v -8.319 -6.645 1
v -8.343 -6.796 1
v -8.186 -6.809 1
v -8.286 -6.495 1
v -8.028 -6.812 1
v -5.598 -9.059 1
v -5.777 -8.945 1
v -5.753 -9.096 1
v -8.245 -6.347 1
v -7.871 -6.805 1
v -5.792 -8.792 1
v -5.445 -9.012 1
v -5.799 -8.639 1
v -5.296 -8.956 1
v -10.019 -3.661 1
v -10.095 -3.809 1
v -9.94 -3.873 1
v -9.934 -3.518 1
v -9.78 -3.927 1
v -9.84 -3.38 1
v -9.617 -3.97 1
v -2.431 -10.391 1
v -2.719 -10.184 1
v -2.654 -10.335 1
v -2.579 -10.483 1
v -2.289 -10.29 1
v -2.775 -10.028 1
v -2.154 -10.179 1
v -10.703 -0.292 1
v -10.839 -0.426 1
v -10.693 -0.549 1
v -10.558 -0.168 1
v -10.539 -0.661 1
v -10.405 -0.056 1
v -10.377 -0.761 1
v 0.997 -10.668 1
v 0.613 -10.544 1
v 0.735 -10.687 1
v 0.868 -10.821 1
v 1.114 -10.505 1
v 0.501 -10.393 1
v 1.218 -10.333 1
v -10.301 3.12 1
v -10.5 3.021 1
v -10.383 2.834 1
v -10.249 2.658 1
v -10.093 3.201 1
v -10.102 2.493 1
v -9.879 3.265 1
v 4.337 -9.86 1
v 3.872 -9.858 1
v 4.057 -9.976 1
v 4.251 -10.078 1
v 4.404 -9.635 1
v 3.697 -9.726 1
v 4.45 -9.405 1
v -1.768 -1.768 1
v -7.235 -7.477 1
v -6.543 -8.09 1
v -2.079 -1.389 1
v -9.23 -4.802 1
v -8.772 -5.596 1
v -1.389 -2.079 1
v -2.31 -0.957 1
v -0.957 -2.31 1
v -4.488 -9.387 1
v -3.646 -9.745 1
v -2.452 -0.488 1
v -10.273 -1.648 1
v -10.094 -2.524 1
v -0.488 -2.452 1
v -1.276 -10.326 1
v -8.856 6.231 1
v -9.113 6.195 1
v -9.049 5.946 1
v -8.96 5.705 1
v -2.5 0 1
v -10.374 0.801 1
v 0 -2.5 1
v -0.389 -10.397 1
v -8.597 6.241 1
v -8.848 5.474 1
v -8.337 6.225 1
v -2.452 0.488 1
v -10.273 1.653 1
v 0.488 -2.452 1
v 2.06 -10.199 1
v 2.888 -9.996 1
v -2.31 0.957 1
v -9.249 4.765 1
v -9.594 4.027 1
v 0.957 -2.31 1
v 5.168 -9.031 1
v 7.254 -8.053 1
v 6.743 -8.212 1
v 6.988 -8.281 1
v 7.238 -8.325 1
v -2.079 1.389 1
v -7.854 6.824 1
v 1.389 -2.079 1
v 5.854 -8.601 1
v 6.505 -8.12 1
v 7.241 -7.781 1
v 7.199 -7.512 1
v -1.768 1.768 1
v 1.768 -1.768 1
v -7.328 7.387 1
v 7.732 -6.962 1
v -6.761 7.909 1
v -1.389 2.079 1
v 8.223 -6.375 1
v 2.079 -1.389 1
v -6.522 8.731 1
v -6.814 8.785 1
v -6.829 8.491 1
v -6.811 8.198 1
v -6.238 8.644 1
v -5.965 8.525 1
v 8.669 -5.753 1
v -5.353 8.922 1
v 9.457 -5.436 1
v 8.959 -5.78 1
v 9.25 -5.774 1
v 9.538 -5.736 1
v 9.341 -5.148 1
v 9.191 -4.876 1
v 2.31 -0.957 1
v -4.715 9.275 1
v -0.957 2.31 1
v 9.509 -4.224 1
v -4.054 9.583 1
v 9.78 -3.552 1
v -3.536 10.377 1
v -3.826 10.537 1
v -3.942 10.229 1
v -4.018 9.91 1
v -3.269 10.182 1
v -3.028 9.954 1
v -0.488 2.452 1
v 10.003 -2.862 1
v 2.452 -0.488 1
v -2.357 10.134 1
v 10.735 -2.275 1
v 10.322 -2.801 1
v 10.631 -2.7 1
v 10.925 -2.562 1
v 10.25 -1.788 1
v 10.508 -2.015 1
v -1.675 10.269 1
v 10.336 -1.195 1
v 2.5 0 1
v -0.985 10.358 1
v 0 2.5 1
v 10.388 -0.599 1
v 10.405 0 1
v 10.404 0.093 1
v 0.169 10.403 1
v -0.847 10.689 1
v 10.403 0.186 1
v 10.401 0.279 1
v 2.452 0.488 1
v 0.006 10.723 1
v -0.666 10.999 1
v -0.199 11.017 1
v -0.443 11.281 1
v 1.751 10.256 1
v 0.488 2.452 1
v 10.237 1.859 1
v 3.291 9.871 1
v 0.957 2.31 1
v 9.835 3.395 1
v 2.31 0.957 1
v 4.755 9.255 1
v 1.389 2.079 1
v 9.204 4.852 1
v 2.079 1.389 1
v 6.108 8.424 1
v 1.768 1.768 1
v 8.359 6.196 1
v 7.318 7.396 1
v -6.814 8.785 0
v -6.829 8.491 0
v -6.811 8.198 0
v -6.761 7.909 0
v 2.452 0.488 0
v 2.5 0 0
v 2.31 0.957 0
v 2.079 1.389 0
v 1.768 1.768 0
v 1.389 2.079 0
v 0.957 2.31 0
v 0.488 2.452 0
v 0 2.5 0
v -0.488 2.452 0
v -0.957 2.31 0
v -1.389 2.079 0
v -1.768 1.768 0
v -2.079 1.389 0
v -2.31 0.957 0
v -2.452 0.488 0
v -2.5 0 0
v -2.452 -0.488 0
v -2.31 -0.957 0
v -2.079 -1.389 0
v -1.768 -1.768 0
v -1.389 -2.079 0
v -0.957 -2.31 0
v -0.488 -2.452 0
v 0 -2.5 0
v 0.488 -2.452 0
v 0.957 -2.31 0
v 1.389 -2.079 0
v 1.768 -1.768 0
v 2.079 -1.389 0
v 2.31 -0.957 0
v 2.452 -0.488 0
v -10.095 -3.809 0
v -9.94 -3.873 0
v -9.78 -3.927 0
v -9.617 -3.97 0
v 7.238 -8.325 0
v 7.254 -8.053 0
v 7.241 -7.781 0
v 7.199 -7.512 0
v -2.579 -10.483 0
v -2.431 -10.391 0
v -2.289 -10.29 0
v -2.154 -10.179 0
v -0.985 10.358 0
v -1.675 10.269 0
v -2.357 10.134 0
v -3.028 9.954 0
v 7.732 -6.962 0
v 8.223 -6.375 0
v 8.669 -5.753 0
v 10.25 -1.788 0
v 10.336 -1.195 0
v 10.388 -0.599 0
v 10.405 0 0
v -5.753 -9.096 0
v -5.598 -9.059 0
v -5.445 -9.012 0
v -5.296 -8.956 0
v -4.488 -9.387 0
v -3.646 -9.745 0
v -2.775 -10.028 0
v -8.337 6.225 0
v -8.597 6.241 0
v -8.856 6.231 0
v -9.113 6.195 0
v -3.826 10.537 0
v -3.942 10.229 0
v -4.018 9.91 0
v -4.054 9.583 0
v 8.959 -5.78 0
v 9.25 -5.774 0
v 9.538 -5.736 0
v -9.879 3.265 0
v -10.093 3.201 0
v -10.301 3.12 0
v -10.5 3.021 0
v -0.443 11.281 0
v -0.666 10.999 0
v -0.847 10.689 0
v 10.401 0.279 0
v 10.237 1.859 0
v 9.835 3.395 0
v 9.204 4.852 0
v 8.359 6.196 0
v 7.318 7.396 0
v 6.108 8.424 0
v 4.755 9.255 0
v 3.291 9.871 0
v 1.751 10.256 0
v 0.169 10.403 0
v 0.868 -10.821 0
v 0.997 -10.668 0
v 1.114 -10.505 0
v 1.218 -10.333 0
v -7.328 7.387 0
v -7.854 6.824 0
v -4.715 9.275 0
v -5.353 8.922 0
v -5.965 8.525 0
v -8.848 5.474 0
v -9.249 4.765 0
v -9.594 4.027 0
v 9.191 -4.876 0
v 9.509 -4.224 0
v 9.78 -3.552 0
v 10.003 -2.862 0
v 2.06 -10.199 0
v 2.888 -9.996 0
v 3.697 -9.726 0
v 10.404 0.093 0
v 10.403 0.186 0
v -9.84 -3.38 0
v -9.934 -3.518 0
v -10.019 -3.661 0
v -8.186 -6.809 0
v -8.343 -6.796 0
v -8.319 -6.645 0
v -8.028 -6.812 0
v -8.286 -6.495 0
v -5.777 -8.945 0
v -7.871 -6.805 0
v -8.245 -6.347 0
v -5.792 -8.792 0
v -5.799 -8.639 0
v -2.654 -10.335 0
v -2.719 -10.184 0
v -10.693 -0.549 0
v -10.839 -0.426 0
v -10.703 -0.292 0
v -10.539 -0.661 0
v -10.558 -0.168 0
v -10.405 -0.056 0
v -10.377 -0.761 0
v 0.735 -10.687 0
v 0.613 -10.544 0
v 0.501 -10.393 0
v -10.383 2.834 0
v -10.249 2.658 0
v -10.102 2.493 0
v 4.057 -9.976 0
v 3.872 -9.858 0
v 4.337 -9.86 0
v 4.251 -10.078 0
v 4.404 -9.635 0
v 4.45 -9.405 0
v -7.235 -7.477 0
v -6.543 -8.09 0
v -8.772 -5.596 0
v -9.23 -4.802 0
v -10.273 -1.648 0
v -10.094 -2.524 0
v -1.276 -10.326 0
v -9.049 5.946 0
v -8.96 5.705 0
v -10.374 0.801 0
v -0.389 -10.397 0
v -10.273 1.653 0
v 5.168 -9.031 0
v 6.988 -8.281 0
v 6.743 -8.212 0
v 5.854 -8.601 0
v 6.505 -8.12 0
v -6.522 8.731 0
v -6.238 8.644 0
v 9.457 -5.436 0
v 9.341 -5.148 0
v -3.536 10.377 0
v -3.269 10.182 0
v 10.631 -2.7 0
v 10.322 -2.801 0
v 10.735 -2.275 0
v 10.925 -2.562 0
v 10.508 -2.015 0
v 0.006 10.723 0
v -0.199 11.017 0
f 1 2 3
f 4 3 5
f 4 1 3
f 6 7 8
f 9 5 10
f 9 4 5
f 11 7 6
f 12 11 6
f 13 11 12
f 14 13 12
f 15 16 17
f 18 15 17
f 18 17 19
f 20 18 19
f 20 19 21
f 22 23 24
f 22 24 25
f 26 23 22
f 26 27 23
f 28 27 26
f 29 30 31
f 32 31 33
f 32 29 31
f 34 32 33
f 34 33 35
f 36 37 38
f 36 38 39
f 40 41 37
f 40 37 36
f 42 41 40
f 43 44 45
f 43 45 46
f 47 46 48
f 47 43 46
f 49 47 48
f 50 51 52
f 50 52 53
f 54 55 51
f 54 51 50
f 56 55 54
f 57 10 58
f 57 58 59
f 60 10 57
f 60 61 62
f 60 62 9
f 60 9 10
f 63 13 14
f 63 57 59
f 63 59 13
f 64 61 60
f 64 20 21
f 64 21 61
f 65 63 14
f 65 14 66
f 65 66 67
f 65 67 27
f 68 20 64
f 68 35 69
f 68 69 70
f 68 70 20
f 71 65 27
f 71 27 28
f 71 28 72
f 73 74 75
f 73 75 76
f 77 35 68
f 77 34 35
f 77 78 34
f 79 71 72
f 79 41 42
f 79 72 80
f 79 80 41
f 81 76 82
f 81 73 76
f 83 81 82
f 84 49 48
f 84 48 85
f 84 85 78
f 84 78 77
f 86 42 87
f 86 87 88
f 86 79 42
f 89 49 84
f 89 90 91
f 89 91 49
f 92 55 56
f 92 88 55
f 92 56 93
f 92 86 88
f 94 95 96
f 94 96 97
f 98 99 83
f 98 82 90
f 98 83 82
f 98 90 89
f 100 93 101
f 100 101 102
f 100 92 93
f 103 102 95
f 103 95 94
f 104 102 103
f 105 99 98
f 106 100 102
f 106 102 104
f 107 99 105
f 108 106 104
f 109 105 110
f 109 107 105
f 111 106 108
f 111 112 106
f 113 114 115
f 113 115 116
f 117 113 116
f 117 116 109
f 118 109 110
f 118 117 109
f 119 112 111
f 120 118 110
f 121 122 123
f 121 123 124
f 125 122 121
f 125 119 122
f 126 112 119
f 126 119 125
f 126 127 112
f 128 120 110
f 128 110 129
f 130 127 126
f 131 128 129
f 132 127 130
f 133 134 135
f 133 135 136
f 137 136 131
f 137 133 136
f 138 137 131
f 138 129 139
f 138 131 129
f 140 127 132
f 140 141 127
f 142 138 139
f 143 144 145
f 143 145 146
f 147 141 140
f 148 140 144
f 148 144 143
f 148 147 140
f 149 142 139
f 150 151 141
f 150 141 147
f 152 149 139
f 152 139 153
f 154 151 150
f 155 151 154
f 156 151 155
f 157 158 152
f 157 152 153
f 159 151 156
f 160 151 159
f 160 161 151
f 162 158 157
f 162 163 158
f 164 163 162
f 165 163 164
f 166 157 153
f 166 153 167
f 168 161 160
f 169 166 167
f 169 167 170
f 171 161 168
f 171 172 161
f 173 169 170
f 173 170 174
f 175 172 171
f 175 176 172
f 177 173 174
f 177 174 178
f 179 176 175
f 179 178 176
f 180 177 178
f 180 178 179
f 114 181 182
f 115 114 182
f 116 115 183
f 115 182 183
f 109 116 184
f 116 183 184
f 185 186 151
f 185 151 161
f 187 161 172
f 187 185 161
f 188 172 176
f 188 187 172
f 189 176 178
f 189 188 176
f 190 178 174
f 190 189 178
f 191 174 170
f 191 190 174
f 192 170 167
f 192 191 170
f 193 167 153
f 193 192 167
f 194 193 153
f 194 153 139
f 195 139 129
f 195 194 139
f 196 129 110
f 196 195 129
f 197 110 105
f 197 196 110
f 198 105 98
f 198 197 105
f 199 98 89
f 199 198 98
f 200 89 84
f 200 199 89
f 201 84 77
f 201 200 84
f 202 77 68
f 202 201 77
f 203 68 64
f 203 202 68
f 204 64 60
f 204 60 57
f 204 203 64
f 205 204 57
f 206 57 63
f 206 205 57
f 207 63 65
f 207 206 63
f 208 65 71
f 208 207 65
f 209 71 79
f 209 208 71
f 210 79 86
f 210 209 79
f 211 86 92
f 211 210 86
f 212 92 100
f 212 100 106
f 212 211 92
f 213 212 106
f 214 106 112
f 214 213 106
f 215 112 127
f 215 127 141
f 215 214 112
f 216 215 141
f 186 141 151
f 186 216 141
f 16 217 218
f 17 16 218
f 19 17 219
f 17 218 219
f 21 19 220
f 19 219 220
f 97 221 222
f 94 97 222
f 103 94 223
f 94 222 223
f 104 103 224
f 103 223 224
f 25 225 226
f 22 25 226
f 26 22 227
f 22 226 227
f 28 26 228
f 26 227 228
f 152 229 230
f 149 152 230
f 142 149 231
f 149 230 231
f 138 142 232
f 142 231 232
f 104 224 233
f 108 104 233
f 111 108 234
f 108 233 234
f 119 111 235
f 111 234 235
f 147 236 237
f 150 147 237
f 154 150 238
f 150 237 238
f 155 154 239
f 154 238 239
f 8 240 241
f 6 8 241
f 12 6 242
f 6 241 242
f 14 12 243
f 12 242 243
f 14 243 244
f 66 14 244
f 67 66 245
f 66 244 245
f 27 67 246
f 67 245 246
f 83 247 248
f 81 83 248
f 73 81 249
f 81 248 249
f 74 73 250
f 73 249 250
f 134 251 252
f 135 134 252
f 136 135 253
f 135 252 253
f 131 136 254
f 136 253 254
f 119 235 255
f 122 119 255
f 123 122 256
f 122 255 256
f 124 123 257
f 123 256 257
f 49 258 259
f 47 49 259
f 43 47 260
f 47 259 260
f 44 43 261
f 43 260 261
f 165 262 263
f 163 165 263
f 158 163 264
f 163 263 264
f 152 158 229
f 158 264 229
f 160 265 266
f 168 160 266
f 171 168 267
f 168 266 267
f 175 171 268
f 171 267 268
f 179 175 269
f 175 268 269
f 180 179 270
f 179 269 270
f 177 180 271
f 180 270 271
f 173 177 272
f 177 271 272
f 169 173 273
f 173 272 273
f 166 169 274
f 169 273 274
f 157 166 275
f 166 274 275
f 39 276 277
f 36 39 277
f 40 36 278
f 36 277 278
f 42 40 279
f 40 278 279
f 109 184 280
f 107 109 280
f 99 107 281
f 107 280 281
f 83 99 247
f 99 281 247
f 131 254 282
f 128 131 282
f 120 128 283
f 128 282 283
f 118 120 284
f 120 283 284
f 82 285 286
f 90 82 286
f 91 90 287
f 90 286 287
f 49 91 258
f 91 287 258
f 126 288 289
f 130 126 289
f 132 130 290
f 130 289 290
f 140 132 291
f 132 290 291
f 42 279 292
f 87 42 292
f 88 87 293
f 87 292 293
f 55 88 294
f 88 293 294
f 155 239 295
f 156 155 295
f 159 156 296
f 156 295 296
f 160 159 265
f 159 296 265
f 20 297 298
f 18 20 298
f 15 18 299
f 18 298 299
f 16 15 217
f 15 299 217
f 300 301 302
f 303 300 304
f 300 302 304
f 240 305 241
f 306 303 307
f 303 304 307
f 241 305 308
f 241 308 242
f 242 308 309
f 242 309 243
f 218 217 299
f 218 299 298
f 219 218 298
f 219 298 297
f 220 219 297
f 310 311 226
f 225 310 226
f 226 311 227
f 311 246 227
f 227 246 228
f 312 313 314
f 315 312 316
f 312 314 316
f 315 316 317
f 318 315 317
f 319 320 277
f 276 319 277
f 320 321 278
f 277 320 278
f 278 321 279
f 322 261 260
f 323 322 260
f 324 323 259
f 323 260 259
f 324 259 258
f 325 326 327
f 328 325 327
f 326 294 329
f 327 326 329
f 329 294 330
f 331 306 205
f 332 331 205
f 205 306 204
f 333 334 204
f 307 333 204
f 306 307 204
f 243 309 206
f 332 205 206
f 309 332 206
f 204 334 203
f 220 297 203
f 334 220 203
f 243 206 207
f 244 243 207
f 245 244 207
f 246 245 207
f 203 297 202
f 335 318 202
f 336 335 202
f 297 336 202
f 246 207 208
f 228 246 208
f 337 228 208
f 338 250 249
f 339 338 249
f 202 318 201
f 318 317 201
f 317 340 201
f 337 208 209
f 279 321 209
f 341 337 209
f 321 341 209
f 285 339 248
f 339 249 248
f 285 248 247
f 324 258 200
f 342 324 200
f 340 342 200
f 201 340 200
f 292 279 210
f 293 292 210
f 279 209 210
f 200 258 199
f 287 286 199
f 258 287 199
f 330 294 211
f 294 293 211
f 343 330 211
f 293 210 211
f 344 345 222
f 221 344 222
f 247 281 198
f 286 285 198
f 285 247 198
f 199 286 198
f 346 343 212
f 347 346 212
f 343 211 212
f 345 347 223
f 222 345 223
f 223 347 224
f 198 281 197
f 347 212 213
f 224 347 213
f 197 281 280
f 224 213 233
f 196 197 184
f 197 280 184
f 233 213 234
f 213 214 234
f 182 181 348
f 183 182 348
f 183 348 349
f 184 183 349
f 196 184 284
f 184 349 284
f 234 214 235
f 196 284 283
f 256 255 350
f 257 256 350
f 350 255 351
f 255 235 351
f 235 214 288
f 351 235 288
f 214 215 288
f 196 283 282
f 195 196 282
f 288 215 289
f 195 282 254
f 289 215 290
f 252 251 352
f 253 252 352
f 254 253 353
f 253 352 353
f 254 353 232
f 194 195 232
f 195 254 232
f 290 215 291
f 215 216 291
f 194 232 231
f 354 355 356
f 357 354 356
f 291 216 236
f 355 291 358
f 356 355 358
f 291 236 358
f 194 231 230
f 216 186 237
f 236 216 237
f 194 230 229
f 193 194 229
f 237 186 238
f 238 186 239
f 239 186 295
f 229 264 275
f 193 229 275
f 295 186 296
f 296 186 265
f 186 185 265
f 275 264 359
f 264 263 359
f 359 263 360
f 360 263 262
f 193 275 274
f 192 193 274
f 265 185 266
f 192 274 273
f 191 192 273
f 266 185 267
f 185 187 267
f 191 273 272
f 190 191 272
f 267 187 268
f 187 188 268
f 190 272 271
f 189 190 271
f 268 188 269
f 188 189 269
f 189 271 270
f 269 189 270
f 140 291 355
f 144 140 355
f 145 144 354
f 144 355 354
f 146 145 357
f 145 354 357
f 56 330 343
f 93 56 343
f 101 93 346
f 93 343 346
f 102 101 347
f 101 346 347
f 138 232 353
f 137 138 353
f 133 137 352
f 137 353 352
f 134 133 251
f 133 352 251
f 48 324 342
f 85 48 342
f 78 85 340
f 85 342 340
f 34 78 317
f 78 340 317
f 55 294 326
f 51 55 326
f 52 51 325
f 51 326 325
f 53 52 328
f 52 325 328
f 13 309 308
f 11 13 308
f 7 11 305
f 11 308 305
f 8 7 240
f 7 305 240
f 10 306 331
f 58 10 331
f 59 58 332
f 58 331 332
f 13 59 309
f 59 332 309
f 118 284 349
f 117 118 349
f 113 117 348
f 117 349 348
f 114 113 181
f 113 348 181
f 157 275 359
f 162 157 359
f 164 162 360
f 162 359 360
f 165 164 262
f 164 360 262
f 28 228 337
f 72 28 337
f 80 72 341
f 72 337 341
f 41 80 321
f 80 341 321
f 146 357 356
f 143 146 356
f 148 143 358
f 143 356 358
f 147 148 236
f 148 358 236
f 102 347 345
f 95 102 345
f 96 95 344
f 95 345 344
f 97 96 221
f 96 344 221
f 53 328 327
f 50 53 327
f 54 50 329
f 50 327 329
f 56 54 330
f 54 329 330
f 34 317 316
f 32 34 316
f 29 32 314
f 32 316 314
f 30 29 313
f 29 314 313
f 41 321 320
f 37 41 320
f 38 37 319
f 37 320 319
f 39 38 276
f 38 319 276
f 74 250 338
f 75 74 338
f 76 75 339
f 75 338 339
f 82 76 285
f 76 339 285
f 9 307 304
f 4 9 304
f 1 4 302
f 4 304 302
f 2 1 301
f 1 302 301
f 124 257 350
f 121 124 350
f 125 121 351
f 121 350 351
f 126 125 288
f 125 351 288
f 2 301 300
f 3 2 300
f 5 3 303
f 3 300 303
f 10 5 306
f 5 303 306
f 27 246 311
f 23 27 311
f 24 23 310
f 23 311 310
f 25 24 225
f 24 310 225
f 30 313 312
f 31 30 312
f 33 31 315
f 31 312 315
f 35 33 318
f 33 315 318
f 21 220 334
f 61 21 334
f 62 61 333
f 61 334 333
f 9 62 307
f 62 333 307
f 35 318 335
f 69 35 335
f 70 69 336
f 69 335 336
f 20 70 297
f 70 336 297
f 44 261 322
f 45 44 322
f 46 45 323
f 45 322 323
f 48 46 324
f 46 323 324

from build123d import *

# Parameters (mm, degrees)
F1_R     = 2.5
F2_DEPTH = 1


with BuildPart() as f2:
    # F1 (on Top) → F2 (new body)
    with BuildSketch(Plane.XY):
        with BuildLine():
            ThreePointArc((10.4010177666, 0.2791052033), (7.3183650566, 7.3959856133), (0.1693586543, 10.4033834852))
            ThreePointArc((0.1693586543, 10.4033834852), (-0.4084890354, 10.3967402104), (-0.9850766389, 10.358025599))
            ThreePointArc((-0.9850766389, 10.358025599), (-2.0168567686, 10.2074168657), (-3.0283814682, 9.9542943486))
            ThreePointArc((-3.0283814682, 9.9542943486), (-3.5459501656, 9.7818867156), (-4.0537711259, 9.5825888962))
            ThreePointArc((-4.0537711259, 9.5825888962), (-5.0373972408, 9.1040485134), (-5.9653480877, 8.5248866554))
            ThreePointArc((-5.9653480877, 8.5248866554), (-6.3706851973, 8.2263868382), (-6.7611105438, 7.9086316458))
            ThreePointArc((-6.7611105438, 7.9086316458), (-7.5960763624, 7.1104637114), (-8.3374242637, 6.2246627975))
            ThreePointArc((-8.3374242637, 6.2246627975), (-8.6009812596, 5.8550996291), (-8.8481688232, 5.4743930047))
            ThreePointArc((-8.8481688232, 5.4743930047), (-9.4287165512, 4.3998152793), (-9.8793415326, 3.2646104174))
            ThreePointArc((-9.8793415326, 3.2646104174), (-9.9979773753, 2.8808885258), (-10.1017152215, 2.4928738192))
            ThreePointArc((-10.1017152215, 2.4928738192), (-10.3320366233, 1.228042959), (-10.4046136849, -0.0555370437))
            ThreePointArc((-10.4046136849, -0.0555370437), (-10.3967402104, -0.4084890354), (-10.3768971195, -0.7609707396))
            ThreePointArc((-10.3768971195, -0.7609707396), (-10.193126284, -2.0878809482), (-9.8403979466, -3.3801832122))
            ThreePointArc((-9.8403979466, -3.3801832122), (-9.7333865621, -3.676990118), (-9.6174251884, -3.9704159783))
            ThreePointArc((-9.6174251884, -3.9704159783), (-9.0097773066, -5.204131357), (-8.2447283135, -6.3469303865))
            ThreePointArc((-8.2447283135, -6.3469303865), (-8.061087037, -6.5785975768), (-7.8709383234, -6.8049540927))
            ThreePointArc((-7.8709383234, -6.8049540927), (-6.8959867768, -7.7913051967), (-5.7985154997, -8.6392296123))
            ThreePointArc((-5.7985154997, -8.6392296123), (-5.549424479, -8.8013043491), (-5.2958064015, -8.9561992414))
            ThreePointArc((-5.2958064015, -8.9561992414), (-4.0708941637, -9.5753272008), (-2.7751475554, -10.0278425566))
            ThreePointArc((-2.7751475554, -10.0278425566), (-2.4655602512, -10.1084164409), (-2.1536422724, -10.1794349184))
            ThreePointArc((-2.1536422724, -10.1794349184), (-0.8330496502, -10.3713595336), (0.5012461634, -10.3926812026))
            ThreePointArc((0.5012461634, -10.3926812026), (0.8600204589, -10.3691578783), (1.2177678025, -10.3332527248))
            ThreePointArc((1.2177678025, -10.3332527248), (2.476254211, -10.105802065), (3.6973306562, -9.725678193))
            ThreePointArc((3.6973306562, -9.725678193), (4.0769602691, -9.5727459623), (4.4502816898, -9.4050020296))
            ThreePointArc((4.4502816898, -9.4050020296), (5.5153513374, -8.8226962954), (6.5053546396, -8.1203098037))
            ThreePointArc((6.5053546396, -8.1203098037), (6.8591715093, -7.823735457), (7.1994838987, -7.5117575764))
            ThreePointArc((7.1994838987, -7.5117575764), (7.983010793, -6.6731258772), (8.6694062261, -5.7533004425))
            ThreePointArc((8.6694062261, -5.7533004425), (8.9411374277, -5.3211964626), (9.1913496147, -4.8762857335))
            ThreePointArc((9.1913496147, -4.8762857335), (9.6500459533, -3.8904605631), (10.0033580362, -2.8621492438))
            ThreePointArc((10.0033580362, -2.8621492438), (10.1409184183, -2.3282705875), (10.2500070535, -1.7878550549))
            ThreePointArc((10.2500070535, -1.7878550549), (10.3660009938, -0.8972701323), (10.4047619048, 0))
            ThreePointArc((10.4047619048, 0), (10.4038258281, 0.1395651578), (10.4010177666, 0.2791052033))
        make_face()
        Circle(F1_R, mode=Mode.SUBTRACT)
        with BuildLine():
            ThreePointArc((-0.9850766389, 10.358025599), (-0.4084890354, 10.3967402104), (0.1693586543, 10.4033834852))
            ThreePointArc((0.1693586543, 10.4033834852), (-0.0915577789, 10.8736948256), (-0.4432176074, 11.280641391))
            ThreePointArc((-0.4432176074, 11.280641391), (-0.7618647264, 10.8473583939), (-0.9850766389, 10.358025599))
        make_face()
        with BuildLine():
            ThreePointArc((-4.0537711259, 9.5825888962), (-3.5459501656, 9.7818867156), (-3.0283814682, 9.9542943486))
            ThreePointArc((-3.0283814682, 9.9542943486), (-3.3994309889, 10.2837794802), (-3.8260663696, 10.5371970223))
            ThreePointArc((-3.8260663696, 10.5371970223), (-3.9851262119, 10.0706763942), (-4.0537711259, 9.5825888962))
        make_face()
        with BuildLine():
            ThreePointArc((10.9249748031, -2.5617942214), (10.6258758179, -2.1413484121), (10.2500070535, -1.7878550549))
            ThreePointArc((10.2500070535, -1.7878550549), (10.1409184183, -2.3282705875), (10.0033580362, -2.8621492438))
            ThreePointArc((10.0033580362, -2.8621492438), (10.4782123863, -2.7550707236), (10.9249748031, -2.5617942214))
        make_face()
        with BuildLine():
            ThreePointArc((-6.7611105438, 7.9086316458), (-6.3706851973, 8.2263868382), (-5.9653480877, 8.5248866554))
            ThreePointArc((-5.9653480877, 8.5248866554), (-6.3783708882, 8.691089302), (-6.8136097843, 8.784781654))
            ThreePointArc((-6.8136097843, 8.784781654), (-6.8244021361, 8.3444870809), (-6.7611105438, 7.9086316458))
        make_face()
        with BuildLine():
            ThreePointArc((9.5380453186, -5.7355619953), (9.4030800104, -5.2904375026), (9.1913496147, -4.8762857335))
            ThreePointArc((9.1913496147, -4.8762857335), (8.9411374277, -5.3211964626), (8.6694062261, -5.7533004425))
            ThreePointArc((8.6694062261, -5.7533004425), (9.1044680071, -5.7807779267), (9.5380453186, -5.7355619953))
        make_face()
        with BuildLine():
            ThreePointArc((-8.8481688232, 5.4743930047), (-8.6009812596, 5.8550996291), (-8.3374242637, 6.2246627975))
            ThreePointArc((-8.3374242637, 6.2246627975), (-8.7265255483, 6.2387786553), (-9.1134062865, 6.1949339122))
            ThreePointArc((-9.1134062865, 6.1949339122), (-9.0073910178, 5.8248704891), (-8.8481688232, 5.4743930047))
        make_face()
        with BuildLine():
            ThreePointArc((7.2382488163, -8.3254097371), (7.2507593771, -7.9170641742), (7.1994838987, -7.5117575764))
            ThreePointArc((7.1994838987, -7.5117575764), (6.8591715093, -7.823735457), (6.5053546396, -8.1203098037))
            ThreePointArc((6.5053546396, -8.1203098037), (6.8642964884, -8.2496786303), (7.2382488163, -8.3254097371))
        make_face()
        with BuildLine():
            ThreePointArc((-10.1017152215, 2.4928738192), (-9.9979773753, 2.8808885258), (-9.8793415326, 3.2646104174))
            ThreePointArc((-9.8793415326, 3.2646104174), (-10.1976364828, 3.162779516), (-10.500335771, 3.0211661383))
            ThreePointArc((-10.500335771, 3.0211661383), (-10.3178144144, 2.7443519774), (-10.1017152215, 2.4928738192))
        make_face()
        with BuildLine():
            ThreePointArc((4.2507054017, -10.0778251054), (4.373179067, -9.7481426651), (4.4502816898, -9.4050020296))
            ThreePointArc((4.4502816898, -9.4050020296), (4.0769602691, -9.5727459623), (3.6973306562, -9.725678193))
            ThreePointArc((3.6973306562, -9.725678193), (3.9629273196, -9.919179939), (4.2507054017, -10.0778251054))
        make_face()
        with BuildLine():
            ThreePointArc((-10.3768971195, -0.7609707396), (-10.3967402104, -0.4084890354), (-10.4046136849, -0.0555370437))
            ThreePointArc((-10.4046136849, -0.0555370437), (-10.6317595983, -0.2288157362), (-10.8386359166, -0.425851165))
            ThreePointArc((-10.8386359166, -0.425851165), (-10.6169381073, -0.6060478704), (-10.3768971195, -0.7609707396))
        make_face()
        with BuildLine():
            ThreePointArc((0.8678566395, -10.8212694742), (1.0568743578, -10.5873437424), (1.2177678025, -10.3332527248))
            ThreePointArc((1.2177678025, -10.3332527248), (0.8600204589, -10.3691578783), (0.5012461634, -10.3926812026))
            ThreePointArc((0.5012461634, -10.3926812026), (0.6729569444, -10.6168931305), (0.8678566395, -10.8212694742))
        make_face()
        with BuildLine():
            ThreePointArc((-9.6174251884, -3.9704159783), (-9.7333865621, -3.676990118), (-9.8403979466, -3.3801832122))
            ThreePointArc((-9.8403979466, -3.3801832122), (-9.978035392, -3.5883525406), (-10.0951915478, -3.8086999272))
            ThreePointArc((-10.0951915478, -3.8086999272), (-9.8602185944, -3.901110143), (-9.6174251884, -3.9704159783))
        make_face()
        with BuildLine():
            ThreePointArc((-2.5791606638, -10.4829693286), (-2.3587946678, -10.341865934), (-2.1536422724, -10.1794349184))
            ThreePointArc((-2.1536422724, -10.1794349184), (-2.4655602512, -10.1084164409), (-2.7751475554, -10.0278425566))
            ThreePointArc((-2.7751475554, -10.0278425566), (-2.6879646474, -10.2600611812), (-2.5791606638, -10.4829693286))
        make_face()
        with BuildLine():
            ThreePointArc((-7.8709383234, -6.8049540927), (-8.061087037, -6.5785975768), (-8.2447283135, -6.3469303865))
            ThreePointArc((-8.2447283135, -6.3469303865), (-8.3036538881, -6.5694261546), (-8.3427761795, -6.7962433419))
            ThreePointArc((-8.3427761795, -6.7962433419), (-8.1070542554, -6.8112698876), (-7.8709383234, -6.8049540927))
        make_face()
        with BuildLine():
            ThreePointArc((-5.7529284377, -9.0960398441), (-5.5211636058, -9.036592423), (-5.2958064015, -8.9561992414))
            ThreePointArc((-5.2958064015, -8.9561992414), (-5.549424479, -8.8013043491), (-5.7985154997, -8.6392296123))
            ThreePointArc((-5.7985154997, -8.6392296123), (-5.7857710928, -8.8686375736), (-5.7529284377, -9.0960398441))
        make_face()
    extrude(amount=F2_DEPTH)


solid = f2.part
